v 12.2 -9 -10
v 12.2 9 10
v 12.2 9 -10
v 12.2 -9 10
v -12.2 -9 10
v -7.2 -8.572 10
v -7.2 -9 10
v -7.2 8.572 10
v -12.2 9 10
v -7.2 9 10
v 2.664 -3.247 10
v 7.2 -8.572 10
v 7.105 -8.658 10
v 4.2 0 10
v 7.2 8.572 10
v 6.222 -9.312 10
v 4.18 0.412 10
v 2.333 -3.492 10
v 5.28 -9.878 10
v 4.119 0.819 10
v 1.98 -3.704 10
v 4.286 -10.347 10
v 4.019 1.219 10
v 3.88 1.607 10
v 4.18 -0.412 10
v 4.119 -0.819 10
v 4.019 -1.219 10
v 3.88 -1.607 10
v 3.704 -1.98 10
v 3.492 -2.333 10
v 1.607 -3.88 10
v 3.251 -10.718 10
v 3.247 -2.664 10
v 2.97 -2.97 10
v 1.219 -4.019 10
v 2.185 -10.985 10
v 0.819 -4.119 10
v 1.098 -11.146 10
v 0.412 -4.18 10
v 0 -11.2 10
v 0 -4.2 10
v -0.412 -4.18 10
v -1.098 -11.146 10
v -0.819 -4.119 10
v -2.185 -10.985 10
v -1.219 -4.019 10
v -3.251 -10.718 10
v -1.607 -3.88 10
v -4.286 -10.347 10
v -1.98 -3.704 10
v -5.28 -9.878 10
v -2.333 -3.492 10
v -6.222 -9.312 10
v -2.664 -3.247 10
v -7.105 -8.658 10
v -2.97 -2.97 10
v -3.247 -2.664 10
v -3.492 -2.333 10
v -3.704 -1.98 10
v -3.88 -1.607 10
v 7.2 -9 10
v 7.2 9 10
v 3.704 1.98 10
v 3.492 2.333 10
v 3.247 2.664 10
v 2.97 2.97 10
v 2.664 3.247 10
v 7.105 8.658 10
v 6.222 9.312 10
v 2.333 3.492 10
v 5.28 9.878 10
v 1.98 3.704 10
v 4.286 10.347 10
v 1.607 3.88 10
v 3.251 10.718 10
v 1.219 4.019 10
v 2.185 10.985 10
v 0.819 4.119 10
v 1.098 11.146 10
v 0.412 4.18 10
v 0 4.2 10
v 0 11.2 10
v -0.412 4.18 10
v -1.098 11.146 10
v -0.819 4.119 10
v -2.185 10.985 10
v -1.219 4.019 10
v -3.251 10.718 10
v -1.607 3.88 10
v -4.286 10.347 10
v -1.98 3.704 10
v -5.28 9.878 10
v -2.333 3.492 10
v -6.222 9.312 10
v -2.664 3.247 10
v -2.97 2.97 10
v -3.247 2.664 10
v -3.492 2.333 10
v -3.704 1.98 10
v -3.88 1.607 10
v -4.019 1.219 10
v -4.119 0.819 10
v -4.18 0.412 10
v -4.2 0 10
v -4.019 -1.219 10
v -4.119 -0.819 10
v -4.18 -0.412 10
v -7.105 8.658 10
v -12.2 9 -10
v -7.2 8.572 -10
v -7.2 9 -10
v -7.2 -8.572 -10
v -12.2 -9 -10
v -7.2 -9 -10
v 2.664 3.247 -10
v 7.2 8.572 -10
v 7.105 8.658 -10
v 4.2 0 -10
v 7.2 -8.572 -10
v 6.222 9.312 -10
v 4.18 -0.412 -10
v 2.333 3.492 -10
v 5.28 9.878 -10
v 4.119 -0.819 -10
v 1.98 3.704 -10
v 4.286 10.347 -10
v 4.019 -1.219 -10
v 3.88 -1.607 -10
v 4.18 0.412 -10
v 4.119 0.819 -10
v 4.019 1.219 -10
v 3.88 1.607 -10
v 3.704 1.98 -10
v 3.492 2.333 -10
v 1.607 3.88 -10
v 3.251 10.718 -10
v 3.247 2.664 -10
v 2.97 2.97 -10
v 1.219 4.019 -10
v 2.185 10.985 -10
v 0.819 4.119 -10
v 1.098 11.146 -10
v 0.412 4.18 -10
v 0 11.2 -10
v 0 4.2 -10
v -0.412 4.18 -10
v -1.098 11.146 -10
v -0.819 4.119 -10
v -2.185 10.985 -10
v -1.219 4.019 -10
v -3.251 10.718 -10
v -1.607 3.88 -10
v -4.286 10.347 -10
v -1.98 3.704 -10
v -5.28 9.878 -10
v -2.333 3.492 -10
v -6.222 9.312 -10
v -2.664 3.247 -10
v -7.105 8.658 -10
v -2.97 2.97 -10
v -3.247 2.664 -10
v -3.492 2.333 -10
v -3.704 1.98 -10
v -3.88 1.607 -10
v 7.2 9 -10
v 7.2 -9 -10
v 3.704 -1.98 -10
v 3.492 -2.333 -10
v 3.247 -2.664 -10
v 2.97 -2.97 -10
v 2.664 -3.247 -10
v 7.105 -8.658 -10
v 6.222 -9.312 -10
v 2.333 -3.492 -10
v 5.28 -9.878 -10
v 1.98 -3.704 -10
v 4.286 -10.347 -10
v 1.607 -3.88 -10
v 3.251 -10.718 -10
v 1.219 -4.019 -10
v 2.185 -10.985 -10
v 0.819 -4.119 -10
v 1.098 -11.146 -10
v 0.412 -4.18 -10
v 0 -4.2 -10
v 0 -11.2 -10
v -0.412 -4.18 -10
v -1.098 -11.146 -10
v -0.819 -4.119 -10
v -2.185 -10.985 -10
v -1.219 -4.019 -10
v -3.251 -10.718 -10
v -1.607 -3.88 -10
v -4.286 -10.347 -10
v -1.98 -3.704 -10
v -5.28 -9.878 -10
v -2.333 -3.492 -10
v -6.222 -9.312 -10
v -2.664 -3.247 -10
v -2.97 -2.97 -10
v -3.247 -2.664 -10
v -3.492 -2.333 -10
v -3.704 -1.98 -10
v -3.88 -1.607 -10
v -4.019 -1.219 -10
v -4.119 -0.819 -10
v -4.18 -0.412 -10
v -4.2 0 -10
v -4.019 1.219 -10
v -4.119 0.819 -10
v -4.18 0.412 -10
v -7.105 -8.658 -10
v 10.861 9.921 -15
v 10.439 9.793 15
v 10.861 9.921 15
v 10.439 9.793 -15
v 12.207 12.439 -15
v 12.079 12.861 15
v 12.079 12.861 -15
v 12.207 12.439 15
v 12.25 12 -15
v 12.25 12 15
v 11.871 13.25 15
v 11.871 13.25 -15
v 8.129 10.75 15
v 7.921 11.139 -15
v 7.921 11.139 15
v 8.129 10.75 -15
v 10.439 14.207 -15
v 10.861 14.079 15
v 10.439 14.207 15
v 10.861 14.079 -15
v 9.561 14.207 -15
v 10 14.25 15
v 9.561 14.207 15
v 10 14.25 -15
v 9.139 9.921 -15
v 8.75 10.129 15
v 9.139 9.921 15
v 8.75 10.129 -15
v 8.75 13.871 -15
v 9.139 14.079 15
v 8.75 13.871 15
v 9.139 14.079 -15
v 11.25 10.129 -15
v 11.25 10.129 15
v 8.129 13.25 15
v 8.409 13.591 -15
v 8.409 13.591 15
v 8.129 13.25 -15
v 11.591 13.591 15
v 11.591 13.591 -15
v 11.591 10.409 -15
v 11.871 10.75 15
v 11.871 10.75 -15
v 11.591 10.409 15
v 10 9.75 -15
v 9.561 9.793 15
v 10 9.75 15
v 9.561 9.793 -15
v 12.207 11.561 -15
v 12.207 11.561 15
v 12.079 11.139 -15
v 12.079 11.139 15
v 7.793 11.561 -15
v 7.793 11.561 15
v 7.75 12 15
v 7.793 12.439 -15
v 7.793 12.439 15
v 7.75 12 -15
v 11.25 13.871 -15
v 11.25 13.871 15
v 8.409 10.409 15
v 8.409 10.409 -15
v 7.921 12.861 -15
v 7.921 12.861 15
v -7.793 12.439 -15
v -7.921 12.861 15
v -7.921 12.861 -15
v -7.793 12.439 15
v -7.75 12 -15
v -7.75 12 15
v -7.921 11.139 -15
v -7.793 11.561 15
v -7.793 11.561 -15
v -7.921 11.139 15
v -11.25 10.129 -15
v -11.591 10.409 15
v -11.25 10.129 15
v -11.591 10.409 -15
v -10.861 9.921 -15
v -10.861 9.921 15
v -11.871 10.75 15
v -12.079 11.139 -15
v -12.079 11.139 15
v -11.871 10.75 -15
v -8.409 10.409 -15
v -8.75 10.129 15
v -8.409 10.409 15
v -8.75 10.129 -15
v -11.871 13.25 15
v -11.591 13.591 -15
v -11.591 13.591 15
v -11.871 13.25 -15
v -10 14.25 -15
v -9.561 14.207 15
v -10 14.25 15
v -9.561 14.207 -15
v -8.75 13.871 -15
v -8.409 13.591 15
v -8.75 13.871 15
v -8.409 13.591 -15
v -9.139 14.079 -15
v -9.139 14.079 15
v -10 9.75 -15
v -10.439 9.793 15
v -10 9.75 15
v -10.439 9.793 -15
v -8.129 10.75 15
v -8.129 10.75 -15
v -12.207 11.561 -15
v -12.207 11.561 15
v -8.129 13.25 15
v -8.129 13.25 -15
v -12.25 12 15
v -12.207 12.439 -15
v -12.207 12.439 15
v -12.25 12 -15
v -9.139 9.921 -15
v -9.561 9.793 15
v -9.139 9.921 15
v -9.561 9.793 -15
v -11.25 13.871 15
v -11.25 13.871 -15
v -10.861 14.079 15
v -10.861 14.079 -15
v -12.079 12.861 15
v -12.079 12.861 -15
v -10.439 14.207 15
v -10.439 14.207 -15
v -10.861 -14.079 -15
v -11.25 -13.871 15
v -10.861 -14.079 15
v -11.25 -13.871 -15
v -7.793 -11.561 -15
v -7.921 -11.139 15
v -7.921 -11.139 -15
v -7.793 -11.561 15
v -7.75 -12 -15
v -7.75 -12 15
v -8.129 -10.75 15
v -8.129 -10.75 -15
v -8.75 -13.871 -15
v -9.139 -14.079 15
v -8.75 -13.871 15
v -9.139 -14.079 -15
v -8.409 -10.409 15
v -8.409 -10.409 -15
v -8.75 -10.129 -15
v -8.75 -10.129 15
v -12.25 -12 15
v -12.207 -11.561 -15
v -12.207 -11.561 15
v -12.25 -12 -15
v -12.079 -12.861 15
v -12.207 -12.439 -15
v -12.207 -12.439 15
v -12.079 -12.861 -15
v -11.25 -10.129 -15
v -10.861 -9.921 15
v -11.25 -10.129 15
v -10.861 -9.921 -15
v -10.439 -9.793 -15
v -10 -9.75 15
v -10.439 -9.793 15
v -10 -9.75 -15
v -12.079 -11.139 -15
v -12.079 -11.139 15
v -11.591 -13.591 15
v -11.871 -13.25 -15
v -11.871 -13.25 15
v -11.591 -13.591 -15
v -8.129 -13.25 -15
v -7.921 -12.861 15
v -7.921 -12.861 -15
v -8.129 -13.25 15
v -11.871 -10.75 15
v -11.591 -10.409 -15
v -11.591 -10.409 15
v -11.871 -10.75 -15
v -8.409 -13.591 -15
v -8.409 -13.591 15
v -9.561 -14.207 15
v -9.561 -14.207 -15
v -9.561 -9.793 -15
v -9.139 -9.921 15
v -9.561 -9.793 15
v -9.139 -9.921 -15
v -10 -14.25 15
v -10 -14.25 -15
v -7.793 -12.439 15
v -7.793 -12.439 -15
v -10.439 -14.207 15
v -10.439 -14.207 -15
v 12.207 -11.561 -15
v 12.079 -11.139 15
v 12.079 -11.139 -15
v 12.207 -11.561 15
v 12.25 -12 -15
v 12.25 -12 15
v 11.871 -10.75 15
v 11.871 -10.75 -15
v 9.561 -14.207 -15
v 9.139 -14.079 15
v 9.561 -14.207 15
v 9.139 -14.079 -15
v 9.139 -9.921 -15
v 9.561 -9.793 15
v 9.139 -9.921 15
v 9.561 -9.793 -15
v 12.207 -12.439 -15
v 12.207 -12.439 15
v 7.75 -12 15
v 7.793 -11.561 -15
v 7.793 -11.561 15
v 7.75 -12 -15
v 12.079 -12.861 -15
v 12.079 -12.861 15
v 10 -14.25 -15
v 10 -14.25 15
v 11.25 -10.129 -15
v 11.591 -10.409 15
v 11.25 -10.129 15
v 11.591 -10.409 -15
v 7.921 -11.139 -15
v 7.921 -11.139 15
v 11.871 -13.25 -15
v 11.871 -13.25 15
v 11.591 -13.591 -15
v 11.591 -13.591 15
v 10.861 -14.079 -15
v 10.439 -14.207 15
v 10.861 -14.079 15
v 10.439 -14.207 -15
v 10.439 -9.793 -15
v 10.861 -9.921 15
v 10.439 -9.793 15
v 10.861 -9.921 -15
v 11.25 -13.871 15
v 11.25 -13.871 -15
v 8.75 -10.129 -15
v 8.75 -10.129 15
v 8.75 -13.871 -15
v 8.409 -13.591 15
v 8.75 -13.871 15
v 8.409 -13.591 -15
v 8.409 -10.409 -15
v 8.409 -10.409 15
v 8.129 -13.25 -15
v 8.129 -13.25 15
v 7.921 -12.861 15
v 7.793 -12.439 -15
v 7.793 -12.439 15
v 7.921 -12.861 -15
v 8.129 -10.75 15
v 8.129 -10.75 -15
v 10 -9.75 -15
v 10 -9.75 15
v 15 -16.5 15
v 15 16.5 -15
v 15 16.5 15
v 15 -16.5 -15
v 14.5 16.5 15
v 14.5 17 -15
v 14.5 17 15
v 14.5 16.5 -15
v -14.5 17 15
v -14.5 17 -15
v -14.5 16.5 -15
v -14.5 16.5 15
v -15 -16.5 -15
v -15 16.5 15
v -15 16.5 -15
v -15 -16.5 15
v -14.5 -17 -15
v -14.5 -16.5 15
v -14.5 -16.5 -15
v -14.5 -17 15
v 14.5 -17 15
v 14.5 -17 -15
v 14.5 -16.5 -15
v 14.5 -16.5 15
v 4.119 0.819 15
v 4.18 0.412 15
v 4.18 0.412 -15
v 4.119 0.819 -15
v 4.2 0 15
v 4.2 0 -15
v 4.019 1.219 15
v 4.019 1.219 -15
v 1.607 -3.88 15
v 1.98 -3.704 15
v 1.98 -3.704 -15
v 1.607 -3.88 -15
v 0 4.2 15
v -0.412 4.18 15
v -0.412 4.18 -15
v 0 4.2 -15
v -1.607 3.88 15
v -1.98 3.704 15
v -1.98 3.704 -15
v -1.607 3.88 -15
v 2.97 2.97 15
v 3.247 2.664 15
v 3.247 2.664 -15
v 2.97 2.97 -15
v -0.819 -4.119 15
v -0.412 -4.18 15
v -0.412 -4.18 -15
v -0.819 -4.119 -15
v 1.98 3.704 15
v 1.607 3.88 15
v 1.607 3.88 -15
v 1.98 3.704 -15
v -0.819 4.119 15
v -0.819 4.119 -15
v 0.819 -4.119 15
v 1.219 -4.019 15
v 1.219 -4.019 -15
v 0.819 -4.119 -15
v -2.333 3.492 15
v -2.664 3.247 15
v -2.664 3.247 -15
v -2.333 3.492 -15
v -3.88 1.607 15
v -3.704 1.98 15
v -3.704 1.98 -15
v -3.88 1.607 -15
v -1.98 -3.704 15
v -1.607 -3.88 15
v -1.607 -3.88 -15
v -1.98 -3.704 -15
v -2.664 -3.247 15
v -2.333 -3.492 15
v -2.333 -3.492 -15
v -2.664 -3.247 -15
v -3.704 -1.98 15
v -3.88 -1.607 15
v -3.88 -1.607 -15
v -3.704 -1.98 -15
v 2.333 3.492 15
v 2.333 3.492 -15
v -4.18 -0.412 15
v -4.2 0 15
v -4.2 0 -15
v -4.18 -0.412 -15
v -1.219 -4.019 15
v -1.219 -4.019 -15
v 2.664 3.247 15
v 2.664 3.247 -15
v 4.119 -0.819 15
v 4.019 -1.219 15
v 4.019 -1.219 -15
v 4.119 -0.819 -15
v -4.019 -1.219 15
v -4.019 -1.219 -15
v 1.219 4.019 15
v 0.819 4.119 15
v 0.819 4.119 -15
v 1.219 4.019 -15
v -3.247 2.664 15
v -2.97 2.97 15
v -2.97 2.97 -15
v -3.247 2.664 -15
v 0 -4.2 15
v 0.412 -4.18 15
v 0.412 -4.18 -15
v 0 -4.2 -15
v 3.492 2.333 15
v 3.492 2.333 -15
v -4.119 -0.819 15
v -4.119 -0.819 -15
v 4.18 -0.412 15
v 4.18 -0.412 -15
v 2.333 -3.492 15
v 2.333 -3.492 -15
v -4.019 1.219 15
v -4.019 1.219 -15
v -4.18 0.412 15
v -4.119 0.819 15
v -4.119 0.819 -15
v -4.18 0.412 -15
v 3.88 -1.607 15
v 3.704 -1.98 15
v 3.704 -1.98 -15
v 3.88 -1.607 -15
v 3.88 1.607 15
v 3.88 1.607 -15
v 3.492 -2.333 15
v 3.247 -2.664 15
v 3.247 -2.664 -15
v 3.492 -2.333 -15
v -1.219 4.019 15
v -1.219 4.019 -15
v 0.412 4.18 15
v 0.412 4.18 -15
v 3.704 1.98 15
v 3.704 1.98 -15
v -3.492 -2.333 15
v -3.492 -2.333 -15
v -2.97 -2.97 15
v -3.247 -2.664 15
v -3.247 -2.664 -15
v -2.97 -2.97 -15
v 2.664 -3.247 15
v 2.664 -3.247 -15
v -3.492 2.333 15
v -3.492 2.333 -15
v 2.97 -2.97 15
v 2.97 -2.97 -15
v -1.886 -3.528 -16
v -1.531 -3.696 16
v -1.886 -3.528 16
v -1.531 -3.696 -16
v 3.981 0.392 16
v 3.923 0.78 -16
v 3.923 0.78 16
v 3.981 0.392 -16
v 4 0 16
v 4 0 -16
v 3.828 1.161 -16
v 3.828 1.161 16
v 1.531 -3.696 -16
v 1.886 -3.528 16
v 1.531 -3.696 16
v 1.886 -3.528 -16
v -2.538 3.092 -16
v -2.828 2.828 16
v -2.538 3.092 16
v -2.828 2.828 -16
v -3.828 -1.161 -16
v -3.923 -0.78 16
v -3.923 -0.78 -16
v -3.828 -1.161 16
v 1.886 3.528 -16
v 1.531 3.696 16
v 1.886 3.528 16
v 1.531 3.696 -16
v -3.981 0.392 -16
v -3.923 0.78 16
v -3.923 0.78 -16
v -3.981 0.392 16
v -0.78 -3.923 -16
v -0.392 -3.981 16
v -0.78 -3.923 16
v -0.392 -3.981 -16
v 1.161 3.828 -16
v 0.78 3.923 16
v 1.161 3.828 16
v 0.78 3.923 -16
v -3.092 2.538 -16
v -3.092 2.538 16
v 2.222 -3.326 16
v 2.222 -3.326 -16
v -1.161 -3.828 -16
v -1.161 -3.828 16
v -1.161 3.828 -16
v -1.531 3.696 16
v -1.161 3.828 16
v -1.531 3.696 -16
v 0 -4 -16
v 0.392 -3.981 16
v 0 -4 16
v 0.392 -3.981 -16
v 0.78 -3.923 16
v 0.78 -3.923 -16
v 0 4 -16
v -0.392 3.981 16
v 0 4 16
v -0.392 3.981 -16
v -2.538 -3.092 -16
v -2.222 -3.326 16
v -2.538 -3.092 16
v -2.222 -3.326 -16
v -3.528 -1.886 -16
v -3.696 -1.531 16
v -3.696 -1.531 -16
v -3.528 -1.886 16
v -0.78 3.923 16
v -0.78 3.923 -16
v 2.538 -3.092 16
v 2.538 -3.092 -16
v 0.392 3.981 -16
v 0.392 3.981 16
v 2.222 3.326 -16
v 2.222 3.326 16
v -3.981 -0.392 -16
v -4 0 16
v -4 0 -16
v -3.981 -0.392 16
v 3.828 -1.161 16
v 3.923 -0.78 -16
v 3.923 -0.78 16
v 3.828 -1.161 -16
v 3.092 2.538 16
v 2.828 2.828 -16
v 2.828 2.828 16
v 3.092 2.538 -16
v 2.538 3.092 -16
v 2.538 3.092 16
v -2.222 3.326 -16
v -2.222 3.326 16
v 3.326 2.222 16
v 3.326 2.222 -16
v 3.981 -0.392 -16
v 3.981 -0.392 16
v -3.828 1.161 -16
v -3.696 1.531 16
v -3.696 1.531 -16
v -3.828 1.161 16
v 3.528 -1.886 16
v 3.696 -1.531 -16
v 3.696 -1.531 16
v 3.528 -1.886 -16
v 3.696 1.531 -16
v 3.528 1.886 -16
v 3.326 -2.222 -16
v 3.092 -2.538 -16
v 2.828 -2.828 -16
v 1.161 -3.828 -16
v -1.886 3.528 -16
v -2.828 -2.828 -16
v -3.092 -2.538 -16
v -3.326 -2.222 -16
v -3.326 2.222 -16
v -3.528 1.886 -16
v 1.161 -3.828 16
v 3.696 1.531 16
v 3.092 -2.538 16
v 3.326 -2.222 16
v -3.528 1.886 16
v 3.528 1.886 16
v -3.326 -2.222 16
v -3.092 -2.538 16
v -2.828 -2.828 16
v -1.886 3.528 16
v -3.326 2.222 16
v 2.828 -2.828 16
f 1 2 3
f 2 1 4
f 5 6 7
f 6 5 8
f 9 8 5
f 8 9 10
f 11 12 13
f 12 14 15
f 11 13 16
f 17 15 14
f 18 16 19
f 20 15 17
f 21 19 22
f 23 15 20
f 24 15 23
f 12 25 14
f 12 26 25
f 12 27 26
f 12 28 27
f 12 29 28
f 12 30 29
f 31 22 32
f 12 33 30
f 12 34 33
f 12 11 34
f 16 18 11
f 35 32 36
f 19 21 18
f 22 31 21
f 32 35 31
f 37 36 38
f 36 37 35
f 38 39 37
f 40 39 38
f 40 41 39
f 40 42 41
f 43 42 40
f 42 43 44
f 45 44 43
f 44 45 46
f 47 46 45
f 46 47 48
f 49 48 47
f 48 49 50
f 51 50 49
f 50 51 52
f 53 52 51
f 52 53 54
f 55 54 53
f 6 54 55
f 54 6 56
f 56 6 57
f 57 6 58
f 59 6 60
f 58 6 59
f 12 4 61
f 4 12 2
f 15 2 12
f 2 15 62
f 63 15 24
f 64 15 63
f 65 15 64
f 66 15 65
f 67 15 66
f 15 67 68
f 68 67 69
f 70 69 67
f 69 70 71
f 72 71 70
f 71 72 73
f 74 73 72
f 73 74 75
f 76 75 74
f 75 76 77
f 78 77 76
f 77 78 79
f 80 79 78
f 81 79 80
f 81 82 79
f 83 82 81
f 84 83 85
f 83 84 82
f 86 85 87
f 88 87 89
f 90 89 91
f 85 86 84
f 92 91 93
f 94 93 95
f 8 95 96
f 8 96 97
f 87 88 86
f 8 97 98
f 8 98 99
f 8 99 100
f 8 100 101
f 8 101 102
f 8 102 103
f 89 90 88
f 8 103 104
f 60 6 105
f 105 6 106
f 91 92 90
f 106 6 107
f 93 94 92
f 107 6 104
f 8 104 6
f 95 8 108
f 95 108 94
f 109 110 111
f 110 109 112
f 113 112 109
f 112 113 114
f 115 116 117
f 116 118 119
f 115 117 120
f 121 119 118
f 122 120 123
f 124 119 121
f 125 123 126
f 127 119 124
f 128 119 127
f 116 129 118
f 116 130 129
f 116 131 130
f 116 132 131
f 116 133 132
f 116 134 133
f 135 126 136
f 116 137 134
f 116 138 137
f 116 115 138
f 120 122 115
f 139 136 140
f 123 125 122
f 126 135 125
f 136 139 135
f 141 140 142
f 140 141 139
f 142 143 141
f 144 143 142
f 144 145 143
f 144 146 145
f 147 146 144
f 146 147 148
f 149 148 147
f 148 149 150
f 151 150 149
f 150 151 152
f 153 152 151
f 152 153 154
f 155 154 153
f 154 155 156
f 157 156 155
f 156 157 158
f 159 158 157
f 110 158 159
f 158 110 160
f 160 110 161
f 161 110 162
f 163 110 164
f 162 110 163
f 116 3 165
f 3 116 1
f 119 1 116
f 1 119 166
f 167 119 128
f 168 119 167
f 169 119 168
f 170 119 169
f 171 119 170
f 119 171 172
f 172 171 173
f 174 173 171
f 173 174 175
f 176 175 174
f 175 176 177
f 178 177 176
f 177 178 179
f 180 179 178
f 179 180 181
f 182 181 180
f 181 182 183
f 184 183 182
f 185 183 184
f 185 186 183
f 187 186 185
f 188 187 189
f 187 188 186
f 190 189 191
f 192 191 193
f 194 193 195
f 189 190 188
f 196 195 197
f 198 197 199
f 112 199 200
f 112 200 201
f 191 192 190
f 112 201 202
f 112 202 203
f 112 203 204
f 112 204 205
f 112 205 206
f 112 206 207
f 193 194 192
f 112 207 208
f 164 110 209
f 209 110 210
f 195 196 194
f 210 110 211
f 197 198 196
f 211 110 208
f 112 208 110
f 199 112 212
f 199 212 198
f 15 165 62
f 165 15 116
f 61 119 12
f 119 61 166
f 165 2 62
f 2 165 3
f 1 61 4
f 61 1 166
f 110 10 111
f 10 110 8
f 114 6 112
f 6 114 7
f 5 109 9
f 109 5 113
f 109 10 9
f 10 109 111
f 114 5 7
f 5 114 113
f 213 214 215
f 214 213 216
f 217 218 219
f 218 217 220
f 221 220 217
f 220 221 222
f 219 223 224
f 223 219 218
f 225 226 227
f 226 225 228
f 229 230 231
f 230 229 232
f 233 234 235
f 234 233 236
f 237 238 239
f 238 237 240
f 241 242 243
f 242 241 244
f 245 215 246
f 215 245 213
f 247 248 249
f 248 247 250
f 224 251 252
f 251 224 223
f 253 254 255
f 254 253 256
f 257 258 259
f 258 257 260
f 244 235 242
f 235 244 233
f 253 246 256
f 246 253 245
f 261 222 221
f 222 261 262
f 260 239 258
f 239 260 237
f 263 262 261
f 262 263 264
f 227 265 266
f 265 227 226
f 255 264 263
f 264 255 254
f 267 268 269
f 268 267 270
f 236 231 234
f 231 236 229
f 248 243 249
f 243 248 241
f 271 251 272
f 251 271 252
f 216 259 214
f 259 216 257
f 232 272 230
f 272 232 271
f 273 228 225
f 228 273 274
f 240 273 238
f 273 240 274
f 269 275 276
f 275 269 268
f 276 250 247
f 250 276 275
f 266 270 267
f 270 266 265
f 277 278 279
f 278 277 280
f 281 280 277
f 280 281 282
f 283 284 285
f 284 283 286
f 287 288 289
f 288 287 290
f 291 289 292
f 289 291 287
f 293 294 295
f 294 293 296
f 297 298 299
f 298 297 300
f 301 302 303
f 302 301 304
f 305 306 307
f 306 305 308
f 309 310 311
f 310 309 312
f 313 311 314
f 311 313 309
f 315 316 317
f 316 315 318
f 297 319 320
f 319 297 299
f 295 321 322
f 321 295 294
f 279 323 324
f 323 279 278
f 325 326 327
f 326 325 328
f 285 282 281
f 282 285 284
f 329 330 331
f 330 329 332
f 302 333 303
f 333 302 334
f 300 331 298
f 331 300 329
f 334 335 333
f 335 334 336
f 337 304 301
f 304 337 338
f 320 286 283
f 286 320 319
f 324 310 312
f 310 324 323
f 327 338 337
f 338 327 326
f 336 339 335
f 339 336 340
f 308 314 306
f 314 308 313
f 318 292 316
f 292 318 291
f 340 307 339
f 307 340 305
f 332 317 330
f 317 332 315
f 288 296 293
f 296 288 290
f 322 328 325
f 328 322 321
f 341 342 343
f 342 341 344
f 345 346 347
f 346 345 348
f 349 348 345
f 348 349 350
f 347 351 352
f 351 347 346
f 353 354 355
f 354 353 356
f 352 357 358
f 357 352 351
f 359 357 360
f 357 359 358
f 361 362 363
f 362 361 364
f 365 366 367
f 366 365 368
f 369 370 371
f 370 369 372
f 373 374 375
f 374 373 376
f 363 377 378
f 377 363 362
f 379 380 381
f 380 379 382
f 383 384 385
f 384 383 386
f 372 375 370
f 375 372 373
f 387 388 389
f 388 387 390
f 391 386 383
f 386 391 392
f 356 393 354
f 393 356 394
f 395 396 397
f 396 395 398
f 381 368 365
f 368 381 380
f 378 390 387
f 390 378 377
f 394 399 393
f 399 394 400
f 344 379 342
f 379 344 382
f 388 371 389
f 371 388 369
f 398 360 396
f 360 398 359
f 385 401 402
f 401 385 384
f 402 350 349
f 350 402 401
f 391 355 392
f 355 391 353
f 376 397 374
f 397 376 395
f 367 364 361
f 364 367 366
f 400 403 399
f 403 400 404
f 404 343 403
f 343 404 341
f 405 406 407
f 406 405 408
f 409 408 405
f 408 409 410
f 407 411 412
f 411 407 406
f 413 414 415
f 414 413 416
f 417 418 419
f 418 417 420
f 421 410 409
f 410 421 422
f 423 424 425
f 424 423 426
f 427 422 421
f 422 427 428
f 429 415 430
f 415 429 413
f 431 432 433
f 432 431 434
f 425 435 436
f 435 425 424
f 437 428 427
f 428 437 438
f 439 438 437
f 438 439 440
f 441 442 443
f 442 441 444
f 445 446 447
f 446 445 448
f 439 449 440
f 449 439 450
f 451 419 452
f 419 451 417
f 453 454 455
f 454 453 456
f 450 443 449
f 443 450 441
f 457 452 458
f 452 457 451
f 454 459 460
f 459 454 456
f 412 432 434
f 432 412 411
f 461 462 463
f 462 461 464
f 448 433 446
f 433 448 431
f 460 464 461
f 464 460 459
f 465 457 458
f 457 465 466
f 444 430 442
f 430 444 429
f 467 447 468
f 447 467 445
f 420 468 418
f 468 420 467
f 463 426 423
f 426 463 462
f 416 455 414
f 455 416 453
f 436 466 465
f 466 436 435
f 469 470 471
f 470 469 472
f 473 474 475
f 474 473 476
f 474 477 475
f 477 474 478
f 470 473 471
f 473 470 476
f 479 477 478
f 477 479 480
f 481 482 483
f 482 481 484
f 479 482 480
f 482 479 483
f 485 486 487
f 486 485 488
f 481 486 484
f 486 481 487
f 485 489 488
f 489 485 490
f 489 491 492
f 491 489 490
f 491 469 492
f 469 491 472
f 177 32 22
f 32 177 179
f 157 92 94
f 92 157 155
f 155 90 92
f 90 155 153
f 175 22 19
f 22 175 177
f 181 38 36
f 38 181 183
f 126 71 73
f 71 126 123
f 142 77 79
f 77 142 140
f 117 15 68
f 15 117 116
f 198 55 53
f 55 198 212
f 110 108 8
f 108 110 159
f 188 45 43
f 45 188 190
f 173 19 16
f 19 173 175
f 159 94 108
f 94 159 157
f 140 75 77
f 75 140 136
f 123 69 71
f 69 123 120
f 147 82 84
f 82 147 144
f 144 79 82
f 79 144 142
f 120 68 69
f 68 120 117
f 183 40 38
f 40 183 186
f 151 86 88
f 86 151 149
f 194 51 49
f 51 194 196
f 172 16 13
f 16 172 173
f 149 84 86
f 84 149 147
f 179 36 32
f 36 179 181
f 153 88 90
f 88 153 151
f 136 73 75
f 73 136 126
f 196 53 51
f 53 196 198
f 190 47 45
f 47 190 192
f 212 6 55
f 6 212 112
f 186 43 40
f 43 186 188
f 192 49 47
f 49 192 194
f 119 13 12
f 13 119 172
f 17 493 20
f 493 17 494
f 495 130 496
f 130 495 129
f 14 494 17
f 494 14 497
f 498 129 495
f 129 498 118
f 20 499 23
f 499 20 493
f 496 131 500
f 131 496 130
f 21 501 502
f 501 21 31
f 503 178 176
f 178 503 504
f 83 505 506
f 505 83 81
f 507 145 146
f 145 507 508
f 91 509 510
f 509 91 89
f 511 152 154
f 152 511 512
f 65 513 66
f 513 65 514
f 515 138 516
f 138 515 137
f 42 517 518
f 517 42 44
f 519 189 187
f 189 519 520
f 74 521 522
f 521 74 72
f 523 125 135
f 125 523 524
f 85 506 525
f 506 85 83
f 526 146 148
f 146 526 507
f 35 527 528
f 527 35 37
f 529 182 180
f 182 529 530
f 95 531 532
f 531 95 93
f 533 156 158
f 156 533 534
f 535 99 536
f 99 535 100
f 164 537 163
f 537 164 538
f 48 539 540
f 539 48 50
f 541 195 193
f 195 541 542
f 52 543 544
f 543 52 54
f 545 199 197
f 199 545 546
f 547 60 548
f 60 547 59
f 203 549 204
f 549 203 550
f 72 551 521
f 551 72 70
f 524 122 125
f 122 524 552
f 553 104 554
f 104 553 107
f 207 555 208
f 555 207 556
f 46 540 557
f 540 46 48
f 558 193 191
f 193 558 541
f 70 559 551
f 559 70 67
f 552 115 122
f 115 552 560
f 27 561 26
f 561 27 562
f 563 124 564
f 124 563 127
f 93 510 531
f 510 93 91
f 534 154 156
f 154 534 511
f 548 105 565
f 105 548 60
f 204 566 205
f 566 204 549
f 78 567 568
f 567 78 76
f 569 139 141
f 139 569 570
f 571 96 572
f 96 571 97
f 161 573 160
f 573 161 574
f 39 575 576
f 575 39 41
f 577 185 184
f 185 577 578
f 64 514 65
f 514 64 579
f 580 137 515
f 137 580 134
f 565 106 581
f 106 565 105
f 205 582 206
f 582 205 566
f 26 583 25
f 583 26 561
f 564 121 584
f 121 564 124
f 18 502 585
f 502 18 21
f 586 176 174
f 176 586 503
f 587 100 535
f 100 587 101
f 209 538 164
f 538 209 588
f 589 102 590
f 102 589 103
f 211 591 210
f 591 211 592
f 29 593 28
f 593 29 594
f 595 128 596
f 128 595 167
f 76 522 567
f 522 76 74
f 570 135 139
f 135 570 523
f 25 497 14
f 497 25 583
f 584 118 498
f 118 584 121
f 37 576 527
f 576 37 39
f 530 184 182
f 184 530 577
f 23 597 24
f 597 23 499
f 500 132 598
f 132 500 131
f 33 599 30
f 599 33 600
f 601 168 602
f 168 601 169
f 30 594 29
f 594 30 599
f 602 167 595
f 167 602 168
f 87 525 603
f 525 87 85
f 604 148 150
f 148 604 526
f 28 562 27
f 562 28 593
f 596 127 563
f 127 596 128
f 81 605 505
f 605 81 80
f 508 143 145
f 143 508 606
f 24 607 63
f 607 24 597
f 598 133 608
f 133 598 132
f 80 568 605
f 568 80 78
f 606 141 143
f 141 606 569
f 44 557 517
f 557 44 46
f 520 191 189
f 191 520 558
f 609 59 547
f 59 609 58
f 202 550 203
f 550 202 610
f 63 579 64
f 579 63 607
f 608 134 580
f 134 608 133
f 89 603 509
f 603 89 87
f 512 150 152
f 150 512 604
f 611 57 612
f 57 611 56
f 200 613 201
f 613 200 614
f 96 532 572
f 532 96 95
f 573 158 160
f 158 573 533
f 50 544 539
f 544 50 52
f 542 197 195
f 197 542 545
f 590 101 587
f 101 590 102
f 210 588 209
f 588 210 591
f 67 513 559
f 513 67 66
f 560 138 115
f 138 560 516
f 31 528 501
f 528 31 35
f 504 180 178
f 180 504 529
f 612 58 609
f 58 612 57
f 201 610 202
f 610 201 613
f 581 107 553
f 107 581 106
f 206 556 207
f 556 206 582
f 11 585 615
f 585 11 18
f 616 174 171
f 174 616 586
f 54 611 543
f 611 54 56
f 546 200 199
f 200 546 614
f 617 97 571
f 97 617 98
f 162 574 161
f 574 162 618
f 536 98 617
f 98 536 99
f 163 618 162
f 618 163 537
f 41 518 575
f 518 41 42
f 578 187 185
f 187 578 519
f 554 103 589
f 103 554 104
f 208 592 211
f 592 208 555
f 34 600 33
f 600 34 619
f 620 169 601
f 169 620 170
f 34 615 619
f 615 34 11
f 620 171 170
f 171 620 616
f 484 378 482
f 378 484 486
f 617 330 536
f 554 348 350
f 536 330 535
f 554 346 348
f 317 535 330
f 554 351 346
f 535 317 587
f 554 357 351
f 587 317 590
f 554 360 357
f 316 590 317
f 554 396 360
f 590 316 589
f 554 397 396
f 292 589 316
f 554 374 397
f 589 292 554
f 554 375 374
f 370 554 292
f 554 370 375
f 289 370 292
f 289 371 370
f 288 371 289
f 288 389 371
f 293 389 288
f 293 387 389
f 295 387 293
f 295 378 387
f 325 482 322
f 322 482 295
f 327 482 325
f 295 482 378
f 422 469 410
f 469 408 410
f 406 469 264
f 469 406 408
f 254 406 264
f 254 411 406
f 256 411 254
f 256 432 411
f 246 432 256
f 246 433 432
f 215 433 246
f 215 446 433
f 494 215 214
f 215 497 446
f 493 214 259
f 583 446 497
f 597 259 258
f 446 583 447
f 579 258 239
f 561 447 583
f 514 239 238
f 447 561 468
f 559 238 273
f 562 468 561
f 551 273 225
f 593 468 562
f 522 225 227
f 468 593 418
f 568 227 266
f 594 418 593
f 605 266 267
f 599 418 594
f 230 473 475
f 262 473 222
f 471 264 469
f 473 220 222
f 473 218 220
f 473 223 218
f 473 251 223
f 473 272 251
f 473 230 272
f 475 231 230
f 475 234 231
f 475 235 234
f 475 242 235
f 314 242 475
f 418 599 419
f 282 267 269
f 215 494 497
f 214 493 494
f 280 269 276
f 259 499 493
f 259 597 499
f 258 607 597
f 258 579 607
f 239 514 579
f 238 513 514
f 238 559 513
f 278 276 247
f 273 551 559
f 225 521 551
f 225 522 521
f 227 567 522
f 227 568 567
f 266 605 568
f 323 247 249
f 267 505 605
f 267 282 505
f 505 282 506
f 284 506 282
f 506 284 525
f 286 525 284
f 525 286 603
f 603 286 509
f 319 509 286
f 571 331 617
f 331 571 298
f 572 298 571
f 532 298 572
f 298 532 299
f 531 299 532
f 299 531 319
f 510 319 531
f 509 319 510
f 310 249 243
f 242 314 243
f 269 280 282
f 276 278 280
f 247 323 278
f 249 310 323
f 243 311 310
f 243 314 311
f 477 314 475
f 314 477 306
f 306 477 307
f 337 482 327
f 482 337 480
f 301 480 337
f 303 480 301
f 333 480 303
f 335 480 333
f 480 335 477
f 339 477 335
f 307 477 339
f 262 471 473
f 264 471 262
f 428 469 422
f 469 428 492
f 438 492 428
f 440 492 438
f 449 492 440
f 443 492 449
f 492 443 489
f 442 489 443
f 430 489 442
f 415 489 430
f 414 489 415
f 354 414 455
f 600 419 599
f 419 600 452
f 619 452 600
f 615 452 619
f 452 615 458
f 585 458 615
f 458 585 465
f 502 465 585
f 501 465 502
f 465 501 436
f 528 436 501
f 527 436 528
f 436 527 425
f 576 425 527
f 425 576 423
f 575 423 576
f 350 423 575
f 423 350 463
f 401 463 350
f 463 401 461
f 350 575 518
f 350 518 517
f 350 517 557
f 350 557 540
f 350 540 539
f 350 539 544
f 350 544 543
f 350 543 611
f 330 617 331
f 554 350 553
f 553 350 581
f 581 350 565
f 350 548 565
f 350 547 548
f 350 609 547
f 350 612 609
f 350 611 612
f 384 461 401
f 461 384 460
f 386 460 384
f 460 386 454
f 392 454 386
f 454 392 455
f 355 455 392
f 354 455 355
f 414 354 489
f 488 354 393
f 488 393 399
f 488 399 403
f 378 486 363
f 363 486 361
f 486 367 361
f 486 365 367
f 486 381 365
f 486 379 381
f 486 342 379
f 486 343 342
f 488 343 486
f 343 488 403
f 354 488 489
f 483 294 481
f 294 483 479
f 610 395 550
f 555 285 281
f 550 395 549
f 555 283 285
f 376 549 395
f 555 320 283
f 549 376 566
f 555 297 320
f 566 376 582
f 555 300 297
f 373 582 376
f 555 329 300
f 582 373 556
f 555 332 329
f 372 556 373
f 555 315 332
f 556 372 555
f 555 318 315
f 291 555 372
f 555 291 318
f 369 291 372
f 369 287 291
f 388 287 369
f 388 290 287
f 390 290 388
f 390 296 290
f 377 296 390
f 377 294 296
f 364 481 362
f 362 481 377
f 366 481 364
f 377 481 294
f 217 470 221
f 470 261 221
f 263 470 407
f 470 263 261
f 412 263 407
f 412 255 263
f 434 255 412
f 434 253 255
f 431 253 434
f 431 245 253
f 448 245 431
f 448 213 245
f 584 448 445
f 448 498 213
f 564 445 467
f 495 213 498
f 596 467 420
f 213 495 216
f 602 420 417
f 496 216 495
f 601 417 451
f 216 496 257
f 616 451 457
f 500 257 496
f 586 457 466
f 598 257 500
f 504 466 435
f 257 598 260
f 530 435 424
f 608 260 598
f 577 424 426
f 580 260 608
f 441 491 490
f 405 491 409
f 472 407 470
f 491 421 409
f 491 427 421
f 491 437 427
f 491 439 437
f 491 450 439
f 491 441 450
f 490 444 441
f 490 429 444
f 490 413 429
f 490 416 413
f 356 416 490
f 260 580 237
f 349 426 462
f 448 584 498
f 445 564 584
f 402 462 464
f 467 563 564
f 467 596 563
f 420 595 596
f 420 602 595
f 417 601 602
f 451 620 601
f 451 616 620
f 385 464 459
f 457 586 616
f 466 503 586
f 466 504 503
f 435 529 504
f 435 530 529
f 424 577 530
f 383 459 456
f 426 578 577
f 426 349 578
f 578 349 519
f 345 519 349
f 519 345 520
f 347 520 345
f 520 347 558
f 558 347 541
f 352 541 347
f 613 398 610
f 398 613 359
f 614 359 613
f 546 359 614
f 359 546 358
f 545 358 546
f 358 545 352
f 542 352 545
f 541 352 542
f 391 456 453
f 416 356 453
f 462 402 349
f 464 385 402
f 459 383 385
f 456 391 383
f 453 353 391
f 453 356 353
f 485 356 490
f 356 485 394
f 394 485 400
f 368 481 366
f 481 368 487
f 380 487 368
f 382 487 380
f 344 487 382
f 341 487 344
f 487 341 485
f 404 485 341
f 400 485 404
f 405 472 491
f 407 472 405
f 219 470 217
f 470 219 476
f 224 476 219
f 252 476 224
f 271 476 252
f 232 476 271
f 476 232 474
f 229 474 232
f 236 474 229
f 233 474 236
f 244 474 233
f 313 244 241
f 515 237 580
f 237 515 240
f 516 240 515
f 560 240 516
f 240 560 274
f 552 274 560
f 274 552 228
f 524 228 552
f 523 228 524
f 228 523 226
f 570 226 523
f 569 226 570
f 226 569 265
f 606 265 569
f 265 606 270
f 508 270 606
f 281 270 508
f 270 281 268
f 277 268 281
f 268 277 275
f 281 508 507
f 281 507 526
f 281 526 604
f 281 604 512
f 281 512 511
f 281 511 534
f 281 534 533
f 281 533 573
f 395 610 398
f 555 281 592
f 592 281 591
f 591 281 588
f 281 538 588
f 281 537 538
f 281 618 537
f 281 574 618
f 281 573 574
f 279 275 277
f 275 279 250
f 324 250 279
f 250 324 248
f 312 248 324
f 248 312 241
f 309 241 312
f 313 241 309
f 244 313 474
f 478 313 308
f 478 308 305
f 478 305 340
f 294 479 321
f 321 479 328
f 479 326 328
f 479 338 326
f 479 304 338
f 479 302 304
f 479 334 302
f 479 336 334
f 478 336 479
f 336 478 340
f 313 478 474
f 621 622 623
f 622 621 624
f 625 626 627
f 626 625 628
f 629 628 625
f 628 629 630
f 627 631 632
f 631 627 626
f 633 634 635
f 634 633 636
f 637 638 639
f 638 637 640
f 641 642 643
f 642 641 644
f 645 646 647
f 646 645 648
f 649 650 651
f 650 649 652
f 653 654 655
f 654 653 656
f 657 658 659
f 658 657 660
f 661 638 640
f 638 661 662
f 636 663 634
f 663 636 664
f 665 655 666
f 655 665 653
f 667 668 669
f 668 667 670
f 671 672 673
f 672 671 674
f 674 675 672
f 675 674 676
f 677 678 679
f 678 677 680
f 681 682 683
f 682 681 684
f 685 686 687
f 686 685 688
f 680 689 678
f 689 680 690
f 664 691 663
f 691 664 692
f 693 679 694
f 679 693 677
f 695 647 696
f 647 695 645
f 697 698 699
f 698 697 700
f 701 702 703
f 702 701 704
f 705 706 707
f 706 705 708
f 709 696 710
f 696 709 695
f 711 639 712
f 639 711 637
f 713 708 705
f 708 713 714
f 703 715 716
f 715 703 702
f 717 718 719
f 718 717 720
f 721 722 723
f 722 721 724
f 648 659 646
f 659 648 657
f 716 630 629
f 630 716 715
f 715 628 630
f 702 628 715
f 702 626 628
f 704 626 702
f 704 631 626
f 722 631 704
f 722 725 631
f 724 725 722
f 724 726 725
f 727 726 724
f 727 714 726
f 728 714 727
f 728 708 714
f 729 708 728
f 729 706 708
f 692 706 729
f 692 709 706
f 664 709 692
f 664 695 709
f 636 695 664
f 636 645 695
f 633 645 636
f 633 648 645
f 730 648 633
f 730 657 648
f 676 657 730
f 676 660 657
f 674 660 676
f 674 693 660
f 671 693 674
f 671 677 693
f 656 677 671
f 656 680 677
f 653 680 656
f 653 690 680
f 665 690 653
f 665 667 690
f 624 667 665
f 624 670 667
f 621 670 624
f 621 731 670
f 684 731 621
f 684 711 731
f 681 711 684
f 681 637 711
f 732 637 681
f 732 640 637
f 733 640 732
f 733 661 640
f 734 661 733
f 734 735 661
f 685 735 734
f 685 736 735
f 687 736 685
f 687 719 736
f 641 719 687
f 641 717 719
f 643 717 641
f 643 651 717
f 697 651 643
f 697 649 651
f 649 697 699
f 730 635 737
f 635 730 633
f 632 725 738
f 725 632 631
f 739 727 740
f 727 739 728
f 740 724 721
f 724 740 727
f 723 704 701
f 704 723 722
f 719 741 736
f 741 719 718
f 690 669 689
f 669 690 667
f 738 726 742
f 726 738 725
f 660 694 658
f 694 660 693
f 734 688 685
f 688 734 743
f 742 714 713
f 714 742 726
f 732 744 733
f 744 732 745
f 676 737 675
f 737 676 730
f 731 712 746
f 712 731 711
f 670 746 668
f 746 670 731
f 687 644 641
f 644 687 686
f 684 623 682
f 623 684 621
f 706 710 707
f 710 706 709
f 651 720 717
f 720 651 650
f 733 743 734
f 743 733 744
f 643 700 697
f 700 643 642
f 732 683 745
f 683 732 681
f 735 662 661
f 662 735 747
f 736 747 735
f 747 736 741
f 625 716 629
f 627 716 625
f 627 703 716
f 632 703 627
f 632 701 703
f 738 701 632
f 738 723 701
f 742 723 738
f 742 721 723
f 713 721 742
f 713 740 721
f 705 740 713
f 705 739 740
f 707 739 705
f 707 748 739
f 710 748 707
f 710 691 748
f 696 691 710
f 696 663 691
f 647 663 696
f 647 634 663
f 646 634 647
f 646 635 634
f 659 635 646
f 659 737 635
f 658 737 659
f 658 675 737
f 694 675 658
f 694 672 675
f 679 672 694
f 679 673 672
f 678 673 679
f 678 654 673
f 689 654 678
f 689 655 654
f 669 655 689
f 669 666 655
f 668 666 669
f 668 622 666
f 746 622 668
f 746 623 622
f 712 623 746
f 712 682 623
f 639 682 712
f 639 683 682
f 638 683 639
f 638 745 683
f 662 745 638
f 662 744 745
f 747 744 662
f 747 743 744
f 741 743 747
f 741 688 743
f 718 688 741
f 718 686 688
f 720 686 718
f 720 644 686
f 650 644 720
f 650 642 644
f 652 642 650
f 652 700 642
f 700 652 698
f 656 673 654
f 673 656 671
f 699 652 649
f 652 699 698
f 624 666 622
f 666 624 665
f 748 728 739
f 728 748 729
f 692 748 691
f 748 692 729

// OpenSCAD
// Parameters
width_mm = 30; //[15:60:1]
depth_mm = 34; //[17:68:1]
height_mm = 30; //[15:60:1]
clearance_mm = 0.2; //[0:1:0.05]
nut_outer_diameter_mm = 22; //[11:44:0.5]
nut_length_mm = 18; //[9:36:0.5]
nut_flange_diameter_mm = 0; //[0:50:0.5]
nut_flange_thickness_mm = 0; //[0:10:0.25]
leadscrew_diameter_mm = 8; //[4:20:0.5]
edge_chamfer_mm = 0.5; //[0:3:0.1]
mount_hole_count = 4; //[0:8:1]
mount_hole_diameter_mm = 4.5; //[2:10:0.25]
mount_hole_spacing_x_mm = 20; //[10:40:0.5]
mount_hole_spacing_y_mm = 24; //[10:50:0.5]
anti_rotation_flat_depth_mm = 1.5; //[0:5:0.25]
anti_rotation_flat_width_mm = 18; //[8:40:0.5]
overlap_mm = 1; //[0.5:2:0.1]

// Leadscrew - complete geometry
module leadscrew() {
  color("Silver") {
    cylinder(r=leadscrew_diameter_mm/2, h=height_mm + 2*overlap_mm, center=true, $fn=64);
  }
}

// Main body block
module main_body_block() {
  color([0.85, 0.85, 0.8]) {
    cube([width_mm, depth_mm, height_mm], center=true);
  }
}

// Nut capture bore or pocket
module nut_capture_bore_or_pocket() {
  cylinder(r=(nut_outer_diameter_mm + 2*clearance_mm)/2, h=nut_length_mm + 2*overlap_mm, center=true, $fn=64);
}

// Nut flange pocket
module nut_flange_pocket() {
  if (nut_flange_diameter_mm > 0 && nut_flange_thickness_mm > 0) {
    cylinder(r=(nut_flange_diameter_mm + 2*clearance_mm)/2, h=nut_flange_thickness_mm + 2*overlap_mm, center=true, $fn=64);
  }
}

// Leadscrew bore
module leadscrew_bore() {
  cylinder(r=(leadscrew_diameter_mm + 2*clearance_mm)/2, h=height_mm + 2*overlap_mm, center=true, $fn=64);
}

// Anti-rotation flat cuts
module anti_rotation_flat_cut() {
  union() {
    translate([(nut_outer_diameter_mm + 2*clearance_mm)/2 - anti_rotation_flat_depth_mm, 0, 0])
      cube([2*anti_rotation_flat_depth_mm + 2*overlap_mm, anti_rotation_flat_width_mm, nut_length_mm + 2*overlap_mm], center=true);
    translate([-((nut_outer_diameter_mm + 2*clearance_mm)/2 - anti_rotation_flat_depth_mm), 0, 0])
      cube([2*anti_rotation_flat_depth_mm + 2*overlap_mm, anti_rotation_flat_width_mm, nut_length_mm + 2*overlap_mm], center=true);
  }
}

// Mounting holes
module mounting_holes() {
  if (mount_hole_count == 4) {
    union() {
      translate([mount_hole_spacing_x_mm/2, mount_hole_spacing_y_mm/2, 0])
        cylinder(r=mount_hole_diameter_mm/2, h=height_mm + 2*overlap_mm, center=true, $fn=32);
      translate([-mount_hole_spacing_x_mm/2, mount_hole_spacing_y_mm/2, 0])
        cylinder(r=mount_hole_diameter_mm/2, h=height_mm + 2*overlap_mm, center=true, $fn=32);
      translate([-mount_hole_spacing_x_mm/2, -mount_hole_spacing_y_mm/2, 0])
        cylinder(r=mount_hole_diameter_mm/2, h=height_mm + 2*overlap_mm, center=true, $fn=32);
      translate([mount_hole_spacing_x_mm/2, -mount_hole_spacing_y_mm/2, 0])
        cylinder(r=mount_hole_diameter_mm/2, h=height_mm + 2*overlap_mm, center=true, $fn=32);
    }
  }
}

// Lead-in chamfers
module lead_in_chamfers() {
  union() {
    translate([width_mm/2 - edge_chamfer_mm/2, depth_mm/2 - edge_chamfer_mm/2, 0])
      cube([edge_chamfer_mm, edge_chamfer_mm, height_mm + 2*overlap_mm], center=true);
    translate([-(width_mm/2 - edge_chamfer_mm/2), depth_mm/2 - edge_chamfer_mm/2, 0])
      cube([edge_chamfer_mm, edge_chamfer_mm, height_mm + 2*overlap_mm], center=true);
    translate([-(width_mm/2 - edge_chamfer_mm/2), -(depth_mm/2 - edge_chamfer_mm/2), 0])
      cube([edge_chamfer_mm, edge_chamfer_mm, height_mm + 2*overlap_mm], center=true);
    translate([width_mm/2 - edge_chamfer_mm/2, -(depth_mm/2 - edge_chamfer_mm/2), 0])
      cube([edge_chamfer_mm, edge_chamfer_mm, height_mm + 2*overlap_mm], center=true);
  }
}

// Assembly
module assembly() {
  difference() {
    main_body_block();
    union() {
      nut_capture_bore_or_pocket();
      if (nut_flange_diameter_mm > 0 && nut_flange_thickness_mm > 0) nut_flange_pocket();
      leadscrew_bore();
      anti_rotation_flat_cut();
      if (mount_hole_count == 4) mounting_holes();
      lead_in_chamfers();
    }
  }
  leadscrew();
}

assembly();
